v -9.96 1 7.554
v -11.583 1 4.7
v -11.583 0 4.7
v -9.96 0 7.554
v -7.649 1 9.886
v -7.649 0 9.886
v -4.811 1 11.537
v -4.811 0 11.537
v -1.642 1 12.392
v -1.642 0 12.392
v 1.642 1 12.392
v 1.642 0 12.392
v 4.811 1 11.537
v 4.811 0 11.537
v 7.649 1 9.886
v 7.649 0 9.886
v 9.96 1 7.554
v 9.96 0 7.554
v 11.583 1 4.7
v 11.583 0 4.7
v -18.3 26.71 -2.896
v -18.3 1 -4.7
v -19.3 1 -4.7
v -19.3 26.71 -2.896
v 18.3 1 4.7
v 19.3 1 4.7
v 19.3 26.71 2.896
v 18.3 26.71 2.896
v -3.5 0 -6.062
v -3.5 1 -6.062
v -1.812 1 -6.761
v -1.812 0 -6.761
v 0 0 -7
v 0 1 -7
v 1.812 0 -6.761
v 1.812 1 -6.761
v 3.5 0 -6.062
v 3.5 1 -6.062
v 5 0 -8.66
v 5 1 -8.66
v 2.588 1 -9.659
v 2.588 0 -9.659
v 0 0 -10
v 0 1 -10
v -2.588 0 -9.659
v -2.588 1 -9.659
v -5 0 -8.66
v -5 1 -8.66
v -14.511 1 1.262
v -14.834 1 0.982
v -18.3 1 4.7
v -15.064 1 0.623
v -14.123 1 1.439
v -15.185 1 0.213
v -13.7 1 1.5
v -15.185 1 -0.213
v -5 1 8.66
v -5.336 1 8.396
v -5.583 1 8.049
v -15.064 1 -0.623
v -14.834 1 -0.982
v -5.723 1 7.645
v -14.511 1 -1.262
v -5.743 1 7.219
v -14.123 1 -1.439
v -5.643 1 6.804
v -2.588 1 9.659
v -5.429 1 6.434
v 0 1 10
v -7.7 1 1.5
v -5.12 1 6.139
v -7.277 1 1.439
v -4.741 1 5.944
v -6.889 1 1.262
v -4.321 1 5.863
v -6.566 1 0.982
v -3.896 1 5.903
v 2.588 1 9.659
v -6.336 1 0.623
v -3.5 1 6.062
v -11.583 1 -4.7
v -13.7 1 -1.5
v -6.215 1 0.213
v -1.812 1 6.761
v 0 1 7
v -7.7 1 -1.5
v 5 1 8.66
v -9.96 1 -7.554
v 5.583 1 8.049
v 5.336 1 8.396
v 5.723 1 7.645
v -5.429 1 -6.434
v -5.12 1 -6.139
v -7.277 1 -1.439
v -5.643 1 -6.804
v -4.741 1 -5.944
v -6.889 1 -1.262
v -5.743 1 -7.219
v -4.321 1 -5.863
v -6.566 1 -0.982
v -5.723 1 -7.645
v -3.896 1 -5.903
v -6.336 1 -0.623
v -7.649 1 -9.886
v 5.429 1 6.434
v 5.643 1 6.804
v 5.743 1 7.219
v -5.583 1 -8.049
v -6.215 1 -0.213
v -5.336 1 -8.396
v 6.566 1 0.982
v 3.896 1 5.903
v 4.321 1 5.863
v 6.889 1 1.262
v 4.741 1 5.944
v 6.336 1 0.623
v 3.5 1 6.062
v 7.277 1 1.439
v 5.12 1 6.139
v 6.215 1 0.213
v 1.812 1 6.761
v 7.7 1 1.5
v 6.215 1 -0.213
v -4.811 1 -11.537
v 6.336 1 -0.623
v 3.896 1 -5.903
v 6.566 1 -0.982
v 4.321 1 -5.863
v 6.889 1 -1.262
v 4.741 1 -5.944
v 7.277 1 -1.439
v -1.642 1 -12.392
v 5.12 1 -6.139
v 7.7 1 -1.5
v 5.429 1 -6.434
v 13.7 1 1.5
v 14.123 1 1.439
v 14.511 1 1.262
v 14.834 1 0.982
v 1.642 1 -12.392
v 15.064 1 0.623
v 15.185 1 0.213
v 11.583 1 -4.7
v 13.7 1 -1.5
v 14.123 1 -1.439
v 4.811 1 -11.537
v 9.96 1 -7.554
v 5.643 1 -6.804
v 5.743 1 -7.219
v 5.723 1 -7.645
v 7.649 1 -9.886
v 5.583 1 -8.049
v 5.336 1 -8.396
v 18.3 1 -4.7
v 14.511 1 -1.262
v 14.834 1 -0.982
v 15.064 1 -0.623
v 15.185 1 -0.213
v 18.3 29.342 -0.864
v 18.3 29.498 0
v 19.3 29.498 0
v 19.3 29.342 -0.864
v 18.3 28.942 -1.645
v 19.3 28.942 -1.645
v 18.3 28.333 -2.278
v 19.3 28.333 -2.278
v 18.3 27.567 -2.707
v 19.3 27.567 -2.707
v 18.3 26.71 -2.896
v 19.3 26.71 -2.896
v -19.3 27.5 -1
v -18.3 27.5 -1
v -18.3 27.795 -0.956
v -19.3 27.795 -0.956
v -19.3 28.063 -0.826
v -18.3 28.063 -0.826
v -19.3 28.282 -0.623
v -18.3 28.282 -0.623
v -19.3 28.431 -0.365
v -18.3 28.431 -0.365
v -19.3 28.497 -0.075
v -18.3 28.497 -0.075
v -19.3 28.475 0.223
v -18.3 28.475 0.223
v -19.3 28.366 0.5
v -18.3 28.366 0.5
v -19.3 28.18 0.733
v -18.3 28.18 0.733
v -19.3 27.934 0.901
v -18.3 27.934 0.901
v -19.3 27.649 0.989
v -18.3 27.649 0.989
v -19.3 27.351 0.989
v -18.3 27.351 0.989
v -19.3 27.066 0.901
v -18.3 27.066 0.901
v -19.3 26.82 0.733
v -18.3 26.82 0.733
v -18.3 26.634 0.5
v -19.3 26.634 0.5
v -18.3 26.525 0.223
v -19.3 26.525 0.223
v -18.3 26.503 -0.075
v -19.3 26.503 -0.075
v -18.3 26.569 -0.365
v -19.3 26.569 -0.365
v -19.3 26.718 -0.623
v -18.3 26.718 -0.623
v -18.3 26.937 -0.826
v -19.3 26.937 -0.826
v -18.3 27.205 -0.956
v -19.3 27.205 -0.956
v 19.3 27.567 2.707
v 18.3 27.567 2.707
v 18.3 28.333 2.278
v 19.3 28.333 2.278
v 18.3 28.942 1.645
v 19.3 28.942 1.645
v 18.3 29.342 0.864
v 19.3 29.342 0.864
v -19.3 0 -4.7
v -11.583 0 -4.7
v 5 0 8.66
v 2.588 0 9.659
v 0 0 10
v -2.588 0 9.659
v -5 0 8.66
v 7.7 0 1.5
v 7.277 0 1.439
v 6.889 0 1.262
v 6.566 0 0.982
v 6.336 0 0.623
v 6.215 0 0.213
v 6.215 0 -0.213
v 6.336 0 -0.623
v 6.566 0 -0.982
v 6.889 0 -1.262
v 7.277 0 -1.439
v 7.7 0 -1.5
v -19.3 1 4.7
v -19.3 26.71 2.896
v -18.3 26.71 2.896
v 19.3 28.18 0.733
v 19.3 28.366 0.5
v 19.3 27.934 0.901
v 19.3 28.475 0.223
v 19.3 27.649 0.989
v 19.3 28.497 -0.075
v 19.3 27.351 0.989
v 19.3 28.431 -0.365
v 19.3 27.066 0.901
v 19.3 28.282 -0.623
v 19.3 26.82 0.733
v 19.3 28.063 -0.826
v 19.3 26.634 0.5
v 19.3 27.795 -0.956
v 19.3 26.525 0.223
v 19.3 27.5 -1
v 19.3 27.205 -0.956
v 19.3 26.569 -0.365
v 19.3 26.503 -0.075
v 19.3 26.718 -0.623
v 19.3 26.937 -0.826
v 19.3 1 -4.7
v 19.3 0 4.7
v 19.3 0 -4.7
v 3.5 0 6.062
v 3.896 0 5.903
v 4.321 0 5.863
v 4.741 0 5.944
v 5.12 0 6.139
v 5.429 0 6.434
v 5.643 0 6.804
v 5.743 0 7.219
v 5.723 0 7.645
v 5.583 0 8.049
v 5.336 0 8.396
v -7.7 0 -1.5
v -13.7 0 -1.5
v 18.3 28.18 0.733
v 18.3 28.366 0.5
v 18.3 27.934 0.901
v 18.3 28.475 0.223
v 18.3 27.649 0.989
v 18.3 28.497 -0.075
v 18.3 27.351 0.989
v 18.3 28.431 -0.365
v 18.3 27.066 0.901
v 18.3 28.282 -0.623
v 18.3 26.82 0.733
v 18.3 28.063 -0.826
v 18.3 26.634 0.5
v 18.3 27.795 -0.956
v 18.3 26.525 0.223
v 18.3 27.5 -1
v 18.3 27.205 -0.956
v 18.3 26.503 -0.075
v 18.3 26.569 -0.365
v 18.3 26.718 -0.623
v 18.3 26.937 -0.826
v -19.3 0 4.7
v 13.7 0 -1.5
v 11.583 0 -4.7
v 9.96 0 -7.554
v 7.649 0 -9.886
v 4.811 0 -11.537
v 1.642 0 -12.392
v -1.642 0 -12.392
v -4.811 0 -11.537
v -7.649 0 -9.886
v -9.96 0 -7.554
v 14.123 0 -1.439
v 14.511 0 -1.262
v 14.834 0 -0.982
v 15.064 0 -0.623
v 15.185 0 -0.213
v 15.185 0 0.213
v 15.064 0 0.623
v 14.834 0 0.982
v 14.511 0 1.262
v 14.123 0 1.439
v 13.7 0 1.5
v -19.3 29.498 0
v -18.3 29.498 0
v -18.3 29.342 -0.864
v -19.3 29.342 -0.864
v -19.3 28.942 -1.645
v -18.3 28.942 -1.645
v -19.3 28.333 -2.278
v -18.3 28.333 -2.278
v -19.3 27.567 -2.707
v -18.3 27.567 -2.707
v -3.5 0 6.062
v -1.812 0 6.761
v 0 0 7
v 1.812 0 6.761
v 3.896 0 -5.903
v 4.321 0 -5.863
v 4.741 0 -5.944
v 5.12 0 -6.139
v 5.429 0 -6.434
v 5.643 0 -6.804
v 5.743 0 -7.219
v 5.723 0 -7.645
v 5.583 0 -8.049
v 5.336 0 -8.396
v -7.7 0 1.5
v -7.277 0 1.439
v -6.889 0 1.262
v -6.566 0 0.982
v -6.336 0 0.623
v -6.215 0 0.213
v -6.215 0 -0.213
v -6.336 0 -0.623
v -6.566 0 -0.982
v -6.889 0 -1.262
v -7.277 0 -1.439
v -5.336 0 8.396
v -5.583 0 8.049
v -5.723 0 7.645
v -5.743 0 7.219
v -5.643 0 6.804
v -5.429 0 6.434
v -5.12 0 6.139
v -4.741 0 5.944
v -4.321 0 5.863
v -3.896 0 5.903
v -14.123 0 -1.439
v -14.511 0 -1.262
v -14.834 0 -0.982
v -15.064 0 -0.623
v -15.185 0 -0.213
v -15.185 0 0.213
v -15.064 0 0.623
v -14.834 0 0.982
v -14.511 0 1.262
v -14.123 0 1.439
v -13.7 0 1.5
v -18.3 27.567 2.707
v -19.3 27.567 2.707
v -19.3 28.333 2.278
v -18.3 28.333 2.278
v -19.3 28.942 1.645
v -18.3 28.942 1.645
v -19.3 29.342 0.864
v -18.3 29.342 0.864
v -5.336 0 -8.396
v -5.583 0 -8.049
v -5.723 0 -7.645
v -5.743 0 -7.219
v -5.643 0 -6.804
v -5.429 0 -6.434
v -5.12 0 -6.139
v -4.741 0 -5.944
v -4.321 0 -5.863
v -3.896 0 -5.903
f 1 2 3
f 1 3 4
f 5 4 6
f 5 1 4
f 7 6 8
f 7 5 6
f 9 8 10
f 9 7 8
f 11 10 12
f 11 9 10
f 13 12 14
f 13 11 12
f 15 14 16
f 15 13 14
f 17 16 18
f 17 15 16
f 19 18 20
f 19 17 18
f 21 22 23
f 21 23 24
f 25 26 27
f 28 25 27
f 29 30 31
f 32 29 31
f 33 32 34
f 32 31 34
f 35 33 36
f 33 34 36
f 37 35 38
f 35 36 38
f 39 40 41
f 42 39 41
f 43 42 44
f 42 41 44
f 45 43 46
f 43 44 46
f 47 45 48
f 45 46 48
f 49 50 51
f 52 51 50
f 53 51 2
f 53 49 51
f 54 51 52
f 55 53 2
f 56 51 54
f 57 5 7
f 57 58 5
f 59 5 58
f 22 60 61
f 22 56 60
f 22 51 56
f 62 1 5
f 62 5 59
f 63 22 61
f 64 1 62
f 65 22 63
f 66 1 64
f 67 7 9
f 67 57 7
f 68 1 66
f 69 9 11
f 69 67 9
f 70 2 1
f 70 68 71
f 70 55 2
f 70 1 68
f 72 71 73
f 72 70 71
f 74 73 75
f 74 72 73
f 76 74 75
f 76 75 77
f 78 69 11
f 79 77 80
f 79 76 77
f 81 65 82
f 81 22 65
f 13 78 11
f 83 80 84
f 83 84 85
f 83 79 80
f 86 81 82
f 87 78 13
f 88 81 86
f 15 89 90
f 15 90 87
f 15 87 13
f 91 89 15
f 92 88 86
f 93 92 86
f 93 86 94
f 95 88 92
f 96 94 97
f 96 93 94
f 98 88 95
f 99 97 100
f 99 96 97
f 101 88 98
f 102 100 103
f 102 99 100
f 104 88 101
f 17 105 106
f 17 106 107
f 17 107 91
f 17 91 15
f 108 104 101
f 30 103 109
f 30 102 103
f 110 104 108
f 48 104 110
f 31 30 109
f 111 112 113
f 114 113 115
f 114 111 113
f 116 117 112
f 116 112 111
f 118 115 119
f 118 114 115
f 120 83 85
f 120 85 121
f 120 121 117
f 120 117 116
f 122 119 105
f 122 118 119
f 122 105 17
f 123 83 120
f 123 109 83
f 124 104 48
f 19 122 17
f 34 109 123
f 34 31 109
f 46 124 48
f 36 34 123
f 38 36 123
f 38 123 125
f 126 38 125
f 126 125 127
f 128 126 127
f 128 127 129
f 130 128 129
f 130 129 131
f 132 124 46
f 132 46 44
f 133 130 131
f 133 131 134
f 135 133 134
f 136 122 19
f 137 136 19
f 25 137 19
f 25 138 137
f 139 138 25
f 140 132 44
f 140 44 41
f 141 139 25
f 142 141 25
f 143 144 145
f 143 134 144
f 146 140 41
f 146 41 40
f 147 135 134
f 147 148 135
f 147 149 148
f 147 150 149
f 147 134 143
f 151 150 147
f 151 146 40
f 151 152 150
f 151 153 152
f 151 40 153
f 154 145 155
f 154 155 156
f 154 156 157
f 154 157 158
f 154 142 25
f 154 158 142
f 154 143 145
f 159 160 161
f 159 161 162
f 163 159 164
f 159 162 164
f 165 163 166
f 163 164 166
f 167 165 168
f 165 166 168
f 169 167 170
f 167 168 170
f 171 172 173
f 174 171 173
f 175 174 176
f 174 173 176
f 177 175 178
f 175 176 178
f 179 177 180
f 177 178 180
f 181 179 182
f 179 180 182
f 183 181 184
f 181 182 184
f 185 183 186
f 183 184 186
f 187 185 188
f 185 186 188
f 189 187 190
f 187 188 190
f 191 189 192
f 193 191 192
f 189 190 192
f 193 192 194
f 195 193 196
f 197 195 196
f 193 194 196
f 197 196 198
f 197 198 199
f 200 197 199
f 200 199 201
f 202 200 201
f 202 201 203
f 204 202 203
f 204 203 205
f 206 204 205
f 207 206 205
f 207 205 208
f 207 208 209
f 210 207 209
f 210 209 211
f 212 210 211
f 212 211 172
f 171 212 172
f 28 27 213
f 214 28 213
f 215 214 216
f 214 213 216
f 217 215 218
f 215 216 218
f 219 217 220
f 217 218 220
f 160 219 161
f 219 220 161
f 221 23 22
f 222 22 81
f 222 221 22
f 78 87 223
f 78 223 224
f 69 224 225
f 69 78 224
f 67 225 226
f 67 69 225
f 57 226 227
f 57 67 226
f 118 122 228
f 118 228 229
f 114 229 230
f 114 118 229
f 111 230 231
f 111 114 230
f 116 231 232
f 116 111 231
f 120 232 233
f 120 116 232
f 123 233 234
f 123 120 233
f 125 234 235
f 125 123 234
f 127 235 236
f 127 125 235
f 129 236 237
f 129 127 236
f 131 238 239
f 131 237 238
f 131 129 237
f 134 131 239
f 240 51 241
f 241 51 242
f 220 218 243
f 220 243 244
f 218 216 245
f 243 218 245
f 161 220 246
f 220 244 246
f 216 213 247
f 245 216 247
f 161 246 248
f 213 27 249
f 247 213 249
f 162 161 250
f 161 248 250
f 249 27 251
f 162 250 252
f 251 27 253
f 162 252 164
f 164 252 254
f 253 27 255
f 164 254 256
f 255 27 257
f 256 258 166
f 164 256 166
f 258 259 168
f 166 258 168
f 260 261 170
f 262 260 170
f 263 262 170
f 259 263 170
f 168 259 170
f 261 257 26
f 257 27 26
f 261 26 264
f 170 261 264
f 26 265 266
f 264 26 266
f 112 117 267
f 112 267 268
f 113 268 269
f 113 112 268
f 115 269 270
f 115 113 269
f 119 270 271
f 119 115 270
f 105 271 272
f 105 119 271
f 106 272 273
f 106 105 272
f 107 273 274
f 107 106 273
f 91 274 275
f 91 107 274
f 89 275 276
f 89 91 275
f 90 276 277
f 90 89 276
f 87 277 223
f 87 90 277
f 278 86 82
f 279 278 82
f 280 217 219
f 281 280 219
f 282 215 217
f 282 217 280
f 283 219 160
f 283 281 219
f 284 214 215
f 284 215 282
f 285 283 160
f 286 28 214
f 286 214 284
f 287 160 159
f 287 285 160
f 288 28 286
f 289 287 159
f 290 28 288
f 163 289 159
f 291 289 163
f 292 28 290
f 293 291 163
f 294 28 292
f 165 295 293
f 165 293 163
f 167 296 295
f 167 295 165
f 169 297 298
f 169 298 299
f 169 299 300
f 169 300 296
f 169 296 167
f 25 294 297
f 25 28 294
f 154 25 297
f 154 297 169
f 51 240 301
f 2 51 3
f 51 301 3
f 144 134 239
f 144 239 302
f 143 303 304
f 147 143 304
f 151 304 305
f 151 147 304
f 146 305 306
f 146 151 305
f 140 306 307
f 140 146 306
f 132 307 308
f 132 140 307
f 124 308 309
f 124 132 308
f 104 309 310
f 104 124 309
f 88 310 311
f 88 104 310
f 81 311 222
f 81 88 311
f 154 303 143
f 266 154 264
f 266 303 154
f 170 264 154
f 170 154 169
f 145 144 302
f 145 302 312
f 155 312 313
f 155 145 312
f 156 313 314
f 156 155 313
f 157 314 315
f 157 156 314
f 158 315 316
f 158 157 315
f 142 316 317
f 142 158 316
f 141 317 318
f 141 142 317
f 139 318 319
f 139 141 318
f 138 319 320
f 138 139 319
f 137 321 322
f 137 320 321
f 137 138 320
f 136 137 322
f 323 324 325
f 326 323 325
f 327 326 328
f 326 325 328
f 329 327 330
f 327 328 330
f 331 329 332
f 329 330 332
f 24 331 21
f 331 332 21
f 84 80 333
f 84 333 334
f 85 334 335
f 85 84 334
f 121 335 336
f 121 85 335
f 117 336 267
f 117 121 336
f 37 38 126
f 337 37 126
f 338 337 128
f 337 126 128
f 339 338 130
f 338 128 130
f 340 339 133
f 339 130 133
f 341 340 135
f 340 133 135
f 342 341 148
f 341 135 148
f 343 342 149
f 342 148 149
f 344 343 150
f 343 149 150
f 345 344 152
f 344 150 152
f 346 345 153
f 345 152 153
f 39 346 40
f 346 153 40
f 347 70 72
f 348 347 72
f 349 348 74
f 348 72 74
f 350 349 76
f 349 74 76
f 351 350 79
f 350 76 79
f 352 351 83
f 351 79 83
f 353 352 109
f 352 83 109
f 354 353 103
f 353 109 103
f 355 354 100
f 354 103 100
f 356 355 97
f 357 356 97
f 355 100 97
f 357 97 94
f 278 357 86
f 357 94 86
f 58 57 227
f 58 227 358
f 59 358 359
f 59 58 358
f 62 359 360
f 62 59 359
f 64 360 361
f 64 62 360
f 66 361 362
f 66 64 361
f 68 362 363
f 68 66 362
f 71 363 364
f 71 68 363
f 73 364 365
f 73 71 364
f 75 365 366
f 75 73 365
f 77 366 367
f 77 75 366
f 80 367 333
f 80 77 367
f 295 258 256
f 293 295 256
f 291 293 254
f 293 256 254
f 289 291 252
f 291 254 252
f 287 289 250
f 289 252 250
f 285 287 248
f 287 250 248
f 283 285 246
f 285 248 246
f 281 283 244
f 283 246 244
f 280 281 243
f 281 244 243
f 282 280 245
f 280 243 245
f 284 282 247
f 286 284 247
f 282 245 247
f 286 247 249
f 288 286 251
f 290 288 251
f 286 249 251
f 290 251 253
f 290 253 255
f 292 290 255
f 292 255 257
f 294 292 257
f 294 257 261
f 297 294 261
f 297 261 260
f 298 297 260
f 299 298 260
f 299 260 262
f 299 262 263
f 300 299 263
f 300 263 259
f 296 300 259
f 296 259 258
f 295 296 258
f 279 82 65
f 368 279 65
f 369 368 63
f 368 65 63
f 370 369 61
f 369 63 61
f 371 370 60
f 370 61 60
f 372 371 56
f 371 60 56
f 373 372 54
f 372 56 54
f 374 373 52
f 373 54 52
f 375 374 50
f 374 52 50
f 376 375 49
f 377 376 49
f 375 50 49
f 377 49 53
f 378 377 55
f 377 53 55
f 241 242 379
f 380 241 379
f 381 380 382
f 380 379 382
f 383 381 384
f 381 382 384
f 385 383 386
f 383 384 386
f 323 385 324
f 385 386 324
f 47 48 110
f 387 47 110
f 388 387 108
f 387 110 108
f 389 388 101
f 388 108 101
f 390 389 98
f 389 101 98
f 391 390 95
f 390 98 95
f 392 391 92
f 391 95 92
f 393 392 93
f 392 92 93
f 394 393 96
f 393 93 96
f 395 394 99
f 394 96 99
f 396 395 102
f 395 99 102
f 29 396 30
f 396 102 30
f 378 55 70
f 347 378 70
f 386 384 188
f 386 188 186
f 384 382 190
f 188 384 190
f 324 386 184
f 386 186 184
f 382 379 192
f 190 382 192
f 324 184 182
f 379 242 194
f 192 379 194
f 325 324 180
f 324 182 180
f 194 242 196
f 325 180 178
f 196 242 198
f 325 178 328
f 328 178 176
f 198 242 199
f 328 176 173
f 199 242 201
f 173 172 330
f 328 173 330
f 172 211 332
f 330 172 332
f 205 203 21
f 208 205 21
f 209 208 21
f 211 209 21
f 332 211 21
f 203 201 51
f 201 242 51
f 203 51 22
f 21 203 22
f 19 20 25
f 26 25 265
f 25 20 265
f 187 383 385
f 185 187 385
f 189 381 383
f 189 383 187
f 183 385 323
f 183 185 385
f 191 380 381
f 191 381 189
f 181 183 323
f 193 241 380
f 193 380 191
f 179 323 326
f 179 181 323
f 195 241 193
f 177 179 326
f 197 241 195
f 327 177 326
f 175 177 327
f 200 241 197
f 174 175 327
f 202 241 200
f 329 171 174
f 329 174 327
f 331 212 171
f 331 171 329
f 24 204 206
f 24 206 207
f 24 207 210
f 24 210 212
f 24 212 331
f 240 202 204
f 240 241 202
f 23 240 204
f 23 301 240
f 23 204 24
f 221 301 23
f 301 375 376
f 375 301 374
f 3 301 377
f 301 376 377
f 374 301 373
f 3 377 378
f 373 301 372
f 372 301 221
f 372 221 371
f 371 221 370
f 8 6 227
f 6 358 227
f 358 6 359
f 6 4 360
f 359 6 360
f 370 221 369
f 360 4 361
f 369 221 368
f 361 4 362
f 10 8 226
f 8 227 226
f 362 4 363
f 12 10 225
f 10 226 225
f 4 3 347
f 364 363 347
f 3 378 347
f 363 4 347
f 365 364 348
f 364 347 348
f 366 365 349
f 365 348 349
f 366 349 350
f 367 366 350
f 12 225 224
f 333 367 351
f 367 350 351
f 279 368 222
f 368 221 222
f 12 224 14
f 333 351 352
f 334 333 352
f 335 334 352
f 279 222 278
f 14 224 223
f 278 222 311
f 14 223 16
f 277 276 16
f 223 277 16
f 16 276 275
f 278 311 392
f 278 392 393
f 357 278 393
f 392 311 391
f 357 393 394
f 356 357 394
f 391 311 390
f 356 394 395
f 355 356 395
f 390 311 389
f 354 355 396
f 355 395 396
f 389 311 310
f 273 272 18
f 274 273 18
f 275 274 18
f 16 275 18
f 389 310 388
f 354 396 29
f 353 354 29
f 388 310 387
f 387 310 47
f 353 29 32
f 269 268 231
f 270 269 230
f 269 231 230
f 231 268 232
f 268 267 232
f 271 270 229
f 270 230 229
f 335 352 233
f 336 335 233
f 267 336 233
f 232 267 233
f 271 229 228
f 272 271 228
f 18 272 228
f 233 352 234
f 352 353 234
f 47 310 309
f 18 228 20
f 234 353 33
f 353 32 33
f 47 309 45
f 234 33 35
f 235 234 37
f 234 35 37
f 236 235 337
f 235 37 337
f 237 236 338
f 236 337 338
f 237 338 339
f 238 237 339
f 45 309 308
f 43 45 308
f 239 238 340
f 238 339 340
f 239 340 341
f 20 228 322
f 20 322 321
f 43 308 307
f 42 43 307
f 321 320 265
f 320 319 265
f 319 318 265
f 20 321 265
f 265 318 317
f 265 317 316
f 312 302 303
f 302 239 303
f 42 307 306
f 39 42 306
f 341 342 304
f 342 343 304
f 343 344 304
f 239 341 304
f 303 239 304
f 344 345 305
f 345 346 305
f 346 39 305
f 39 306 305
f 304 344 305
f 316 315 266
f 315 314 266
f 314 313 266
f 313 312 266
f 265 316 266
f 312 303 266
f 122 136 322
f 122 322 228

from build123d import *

# Parameters (mm, degrees)
SKETCH_2_W          = 38.6
SKETCH_2_H          = 9.4
EXTRUDE_1_DEPTH     = 1
SKETCH_3_W          = 1
SKETCH_3_H          = 9.4
EXTRUDE_2_DEPTH     = 28.5
SKETCH_4_R          = 12.5
EXTRUDE_3_DEPTH     = 1
CUT_EXTRUDE_1_DEPTH = 37.619530308
CUT_EXTRUDE_2_DEPTH = 51.164329957
SKETCH_7_R          = 1
CUT_EXTRUDE_3_DEPTH = 51.164329957
FILLET_1_R          = 3


with BuildPart() as part:
    # 草图2 → 凸台-拉伸1 (new body)
    with BuildSketch(Plane(origin=(0, 0, 0), x_dir=(1, 0, 0), z_dir=(0, 1, 0))):
        Rectangle(SKETCH_2_W, SKETCH_2_H)
    extrude(amount=EXTRUDE_1_DEPTH)

    # 草图3 → 凸台-拉伸2 (add)
    with BuildSketch(Plane(origin=(0, 1, 0), x_dir=(1, 0, 0), z_dir=(0, 1, 0))):
        with Locations((-18.8, 0)):
            Rectangle(SKETCH_3_W, SKETCH_3_H)
        with Locations((18.8, 0)):
            Rectangle(SKETCH_3_W, SKETCH_3_H)
    extrude(amount=EXTRUDE_2_DEPTH)

    # 草图4 → 凸台-拉伸3 (add)
    with BuildSketch(Plane(origin=(0, 1, 0), x_dir=(1, 0, 0), z_dir=(0, 1, 0))):
        Circle(SKETCH_4_R)
        with BuildLine():
            ThreePointArc((5, -8.660254038), (0, -10), (-5, -8.660254038))
            ThreePointArc((-5, -8.660254038), (-5.549038106, -6.611215932), (-3.5, -6.062177826))
            ThreePointArc((-3.5, -6.062177826), (0, -7), (3.5, -6.062177826))
            ThreePointArc((3.5, -6.062177826), (5.549038106, -6.611215932), (5, -8.660254038))
        make_face(mode=Mode.SUBTRACT)
        with BuildLine():
            ThreePointArc((5, 8.660254038), (0, 10), (-5, 8.660254038))
            ThreePointArc((-5, 8.660254038), (-5.549038106, 6.611215932), (-3.5, 6.062177826))
            ThreePointArc((-3.5, 6.062177826), (0, 7), (3.5, 6.062177826))
            ThreePointArc((3.5, 6.062177826), (5.549038106, 6.611215932), (5, 8.660254038))
        make_face(mode=Mode.SUBTRACT)
    extrude(amount=-EXTRUDE_3_DEPTH)

    # 草图5 → 切除-拉伸1 (cut, through all)
    with BuildSketch(Plane(origin=(0, 1, 0), x_dir=(1, 0, 0), z_dir=(0, 1, 0))):
        with BuildLine():
            Line((13.7, -1.5), (7.7, -1.5))
            ThreePointArc((7.7, -1.5), (6.2, 0), (7.7, 1.5))
            Line((7.7, 1.5), (13.7, 1.5))
            ThreePointArc((13.7, 1.5), (15.2, 0), (13.7, -1.5))
        make_face()
        with BuildLine():
            Line((-13.7, -1.5), (-7.7, -1.5))
            ThreePointArc((-7.7, -1.5), (-6.2, 0), (-7.7, 1.5))
            Line((-7.7, 1.5), (-13.7, 1.5))
            ThreePointArc((-13.7, 1.5), (-15.2, 0), (-13.7, -1.5))
        make_face()
    extrude(amount=-CUT_EXTRUDE_1_DEPTH, mode=Mode.SUBTRACT)

    # 草图6 → 切除-拉伸2 (cut, through all)
    with BuildSketch(Plane(origin=(19.3, 0, 0), x_dir=(0, 0, -1), z_dir=(1, 0, 0))):
        Polygon((-4.7, 29.5), (-4.7, 1), (-2.7, 29.5), align=None)
        Polygon((4.7, 1), (2.7, 29.5), (4.7, 29.5), align=None)
    extrude(amount=-CUT_EXTRUDE_2_DEPTH, mode=Mode.SUBTRACT)

    # 草图7 → 切除-拉伸3 (cut, through all)
    with BuildSketch(Plane(origin=(19.3, 0, 0), x_dir=(0, 0, -1), z_dir=(1, 0, 0))):
        with Locations((0, 27.5)):
            Circle(SKETCH_7_R)
    extrude(amount=-CUT_EXTRUDE_3_DEPTH, mode=Mode.SUBTRACT)

    # 圆角1
    # the kernel refuses this fillet: 3 mm, written as the material it takes off along each edge
    with BuildSketch(Plane(origin=(-11.307871249, 29.5, -2.7), x_dir=(0, -0.9975467611004155, -0.0700032814807308), z_dir=(-1, 0, 0))) as fillet_1_piece_1:
        with BuildLine():
            CenterArc((FILLET_1_R * 0.932283833485, FILLET_1_R), FILLET_1_R, 184.014175695, 85.985824305)
            Line((-FILLET_1_R * 0.0652629276154, FILLET_1_R * 0.929996718519), (0, 0))
            Line((0, 0), (FILLET_1_R * 0.932283833485, 0))
        make_face()
    extrude(amount=14.984257502, mode=Mode.SUBTRACT)
    with BuildSketch(Plane(origin=(-11.307871249, 29.5, 2.7), x_dir=(0, -0.9975467611004155, 0.0700032814807308), z_dir=(-1, 0, 0)), Plane(origin=(26.292128751, 29.5, -2.7), x_dir=(0, 0, 1), z_dir=(-1, 0, 0)), Plane(origin=(26.292128751, 29.5, 2.7), x_dir=(0, -0.9975467611004155, 0.0700032814807308), z_dir=(-1, 0, 0))) as fillet_1_piece_2:
        with BuildLine():
            CenterArc((FILLET_1_R * 0.932283833485, -FILLET_1_R), FILLET_1_R, 90, 85.985824305)
            Line((-FILLET_1_R * 0.0652629276154, -FILLET_1_R * 0.929996718519), (0, 0))
            Line((0, 0), (FILLET_1_R * 0.932283833485, 0))
        make_face()
    extrude(amount=14.984257502, mode=Mode.SUBTRACT)


solid = part.part
